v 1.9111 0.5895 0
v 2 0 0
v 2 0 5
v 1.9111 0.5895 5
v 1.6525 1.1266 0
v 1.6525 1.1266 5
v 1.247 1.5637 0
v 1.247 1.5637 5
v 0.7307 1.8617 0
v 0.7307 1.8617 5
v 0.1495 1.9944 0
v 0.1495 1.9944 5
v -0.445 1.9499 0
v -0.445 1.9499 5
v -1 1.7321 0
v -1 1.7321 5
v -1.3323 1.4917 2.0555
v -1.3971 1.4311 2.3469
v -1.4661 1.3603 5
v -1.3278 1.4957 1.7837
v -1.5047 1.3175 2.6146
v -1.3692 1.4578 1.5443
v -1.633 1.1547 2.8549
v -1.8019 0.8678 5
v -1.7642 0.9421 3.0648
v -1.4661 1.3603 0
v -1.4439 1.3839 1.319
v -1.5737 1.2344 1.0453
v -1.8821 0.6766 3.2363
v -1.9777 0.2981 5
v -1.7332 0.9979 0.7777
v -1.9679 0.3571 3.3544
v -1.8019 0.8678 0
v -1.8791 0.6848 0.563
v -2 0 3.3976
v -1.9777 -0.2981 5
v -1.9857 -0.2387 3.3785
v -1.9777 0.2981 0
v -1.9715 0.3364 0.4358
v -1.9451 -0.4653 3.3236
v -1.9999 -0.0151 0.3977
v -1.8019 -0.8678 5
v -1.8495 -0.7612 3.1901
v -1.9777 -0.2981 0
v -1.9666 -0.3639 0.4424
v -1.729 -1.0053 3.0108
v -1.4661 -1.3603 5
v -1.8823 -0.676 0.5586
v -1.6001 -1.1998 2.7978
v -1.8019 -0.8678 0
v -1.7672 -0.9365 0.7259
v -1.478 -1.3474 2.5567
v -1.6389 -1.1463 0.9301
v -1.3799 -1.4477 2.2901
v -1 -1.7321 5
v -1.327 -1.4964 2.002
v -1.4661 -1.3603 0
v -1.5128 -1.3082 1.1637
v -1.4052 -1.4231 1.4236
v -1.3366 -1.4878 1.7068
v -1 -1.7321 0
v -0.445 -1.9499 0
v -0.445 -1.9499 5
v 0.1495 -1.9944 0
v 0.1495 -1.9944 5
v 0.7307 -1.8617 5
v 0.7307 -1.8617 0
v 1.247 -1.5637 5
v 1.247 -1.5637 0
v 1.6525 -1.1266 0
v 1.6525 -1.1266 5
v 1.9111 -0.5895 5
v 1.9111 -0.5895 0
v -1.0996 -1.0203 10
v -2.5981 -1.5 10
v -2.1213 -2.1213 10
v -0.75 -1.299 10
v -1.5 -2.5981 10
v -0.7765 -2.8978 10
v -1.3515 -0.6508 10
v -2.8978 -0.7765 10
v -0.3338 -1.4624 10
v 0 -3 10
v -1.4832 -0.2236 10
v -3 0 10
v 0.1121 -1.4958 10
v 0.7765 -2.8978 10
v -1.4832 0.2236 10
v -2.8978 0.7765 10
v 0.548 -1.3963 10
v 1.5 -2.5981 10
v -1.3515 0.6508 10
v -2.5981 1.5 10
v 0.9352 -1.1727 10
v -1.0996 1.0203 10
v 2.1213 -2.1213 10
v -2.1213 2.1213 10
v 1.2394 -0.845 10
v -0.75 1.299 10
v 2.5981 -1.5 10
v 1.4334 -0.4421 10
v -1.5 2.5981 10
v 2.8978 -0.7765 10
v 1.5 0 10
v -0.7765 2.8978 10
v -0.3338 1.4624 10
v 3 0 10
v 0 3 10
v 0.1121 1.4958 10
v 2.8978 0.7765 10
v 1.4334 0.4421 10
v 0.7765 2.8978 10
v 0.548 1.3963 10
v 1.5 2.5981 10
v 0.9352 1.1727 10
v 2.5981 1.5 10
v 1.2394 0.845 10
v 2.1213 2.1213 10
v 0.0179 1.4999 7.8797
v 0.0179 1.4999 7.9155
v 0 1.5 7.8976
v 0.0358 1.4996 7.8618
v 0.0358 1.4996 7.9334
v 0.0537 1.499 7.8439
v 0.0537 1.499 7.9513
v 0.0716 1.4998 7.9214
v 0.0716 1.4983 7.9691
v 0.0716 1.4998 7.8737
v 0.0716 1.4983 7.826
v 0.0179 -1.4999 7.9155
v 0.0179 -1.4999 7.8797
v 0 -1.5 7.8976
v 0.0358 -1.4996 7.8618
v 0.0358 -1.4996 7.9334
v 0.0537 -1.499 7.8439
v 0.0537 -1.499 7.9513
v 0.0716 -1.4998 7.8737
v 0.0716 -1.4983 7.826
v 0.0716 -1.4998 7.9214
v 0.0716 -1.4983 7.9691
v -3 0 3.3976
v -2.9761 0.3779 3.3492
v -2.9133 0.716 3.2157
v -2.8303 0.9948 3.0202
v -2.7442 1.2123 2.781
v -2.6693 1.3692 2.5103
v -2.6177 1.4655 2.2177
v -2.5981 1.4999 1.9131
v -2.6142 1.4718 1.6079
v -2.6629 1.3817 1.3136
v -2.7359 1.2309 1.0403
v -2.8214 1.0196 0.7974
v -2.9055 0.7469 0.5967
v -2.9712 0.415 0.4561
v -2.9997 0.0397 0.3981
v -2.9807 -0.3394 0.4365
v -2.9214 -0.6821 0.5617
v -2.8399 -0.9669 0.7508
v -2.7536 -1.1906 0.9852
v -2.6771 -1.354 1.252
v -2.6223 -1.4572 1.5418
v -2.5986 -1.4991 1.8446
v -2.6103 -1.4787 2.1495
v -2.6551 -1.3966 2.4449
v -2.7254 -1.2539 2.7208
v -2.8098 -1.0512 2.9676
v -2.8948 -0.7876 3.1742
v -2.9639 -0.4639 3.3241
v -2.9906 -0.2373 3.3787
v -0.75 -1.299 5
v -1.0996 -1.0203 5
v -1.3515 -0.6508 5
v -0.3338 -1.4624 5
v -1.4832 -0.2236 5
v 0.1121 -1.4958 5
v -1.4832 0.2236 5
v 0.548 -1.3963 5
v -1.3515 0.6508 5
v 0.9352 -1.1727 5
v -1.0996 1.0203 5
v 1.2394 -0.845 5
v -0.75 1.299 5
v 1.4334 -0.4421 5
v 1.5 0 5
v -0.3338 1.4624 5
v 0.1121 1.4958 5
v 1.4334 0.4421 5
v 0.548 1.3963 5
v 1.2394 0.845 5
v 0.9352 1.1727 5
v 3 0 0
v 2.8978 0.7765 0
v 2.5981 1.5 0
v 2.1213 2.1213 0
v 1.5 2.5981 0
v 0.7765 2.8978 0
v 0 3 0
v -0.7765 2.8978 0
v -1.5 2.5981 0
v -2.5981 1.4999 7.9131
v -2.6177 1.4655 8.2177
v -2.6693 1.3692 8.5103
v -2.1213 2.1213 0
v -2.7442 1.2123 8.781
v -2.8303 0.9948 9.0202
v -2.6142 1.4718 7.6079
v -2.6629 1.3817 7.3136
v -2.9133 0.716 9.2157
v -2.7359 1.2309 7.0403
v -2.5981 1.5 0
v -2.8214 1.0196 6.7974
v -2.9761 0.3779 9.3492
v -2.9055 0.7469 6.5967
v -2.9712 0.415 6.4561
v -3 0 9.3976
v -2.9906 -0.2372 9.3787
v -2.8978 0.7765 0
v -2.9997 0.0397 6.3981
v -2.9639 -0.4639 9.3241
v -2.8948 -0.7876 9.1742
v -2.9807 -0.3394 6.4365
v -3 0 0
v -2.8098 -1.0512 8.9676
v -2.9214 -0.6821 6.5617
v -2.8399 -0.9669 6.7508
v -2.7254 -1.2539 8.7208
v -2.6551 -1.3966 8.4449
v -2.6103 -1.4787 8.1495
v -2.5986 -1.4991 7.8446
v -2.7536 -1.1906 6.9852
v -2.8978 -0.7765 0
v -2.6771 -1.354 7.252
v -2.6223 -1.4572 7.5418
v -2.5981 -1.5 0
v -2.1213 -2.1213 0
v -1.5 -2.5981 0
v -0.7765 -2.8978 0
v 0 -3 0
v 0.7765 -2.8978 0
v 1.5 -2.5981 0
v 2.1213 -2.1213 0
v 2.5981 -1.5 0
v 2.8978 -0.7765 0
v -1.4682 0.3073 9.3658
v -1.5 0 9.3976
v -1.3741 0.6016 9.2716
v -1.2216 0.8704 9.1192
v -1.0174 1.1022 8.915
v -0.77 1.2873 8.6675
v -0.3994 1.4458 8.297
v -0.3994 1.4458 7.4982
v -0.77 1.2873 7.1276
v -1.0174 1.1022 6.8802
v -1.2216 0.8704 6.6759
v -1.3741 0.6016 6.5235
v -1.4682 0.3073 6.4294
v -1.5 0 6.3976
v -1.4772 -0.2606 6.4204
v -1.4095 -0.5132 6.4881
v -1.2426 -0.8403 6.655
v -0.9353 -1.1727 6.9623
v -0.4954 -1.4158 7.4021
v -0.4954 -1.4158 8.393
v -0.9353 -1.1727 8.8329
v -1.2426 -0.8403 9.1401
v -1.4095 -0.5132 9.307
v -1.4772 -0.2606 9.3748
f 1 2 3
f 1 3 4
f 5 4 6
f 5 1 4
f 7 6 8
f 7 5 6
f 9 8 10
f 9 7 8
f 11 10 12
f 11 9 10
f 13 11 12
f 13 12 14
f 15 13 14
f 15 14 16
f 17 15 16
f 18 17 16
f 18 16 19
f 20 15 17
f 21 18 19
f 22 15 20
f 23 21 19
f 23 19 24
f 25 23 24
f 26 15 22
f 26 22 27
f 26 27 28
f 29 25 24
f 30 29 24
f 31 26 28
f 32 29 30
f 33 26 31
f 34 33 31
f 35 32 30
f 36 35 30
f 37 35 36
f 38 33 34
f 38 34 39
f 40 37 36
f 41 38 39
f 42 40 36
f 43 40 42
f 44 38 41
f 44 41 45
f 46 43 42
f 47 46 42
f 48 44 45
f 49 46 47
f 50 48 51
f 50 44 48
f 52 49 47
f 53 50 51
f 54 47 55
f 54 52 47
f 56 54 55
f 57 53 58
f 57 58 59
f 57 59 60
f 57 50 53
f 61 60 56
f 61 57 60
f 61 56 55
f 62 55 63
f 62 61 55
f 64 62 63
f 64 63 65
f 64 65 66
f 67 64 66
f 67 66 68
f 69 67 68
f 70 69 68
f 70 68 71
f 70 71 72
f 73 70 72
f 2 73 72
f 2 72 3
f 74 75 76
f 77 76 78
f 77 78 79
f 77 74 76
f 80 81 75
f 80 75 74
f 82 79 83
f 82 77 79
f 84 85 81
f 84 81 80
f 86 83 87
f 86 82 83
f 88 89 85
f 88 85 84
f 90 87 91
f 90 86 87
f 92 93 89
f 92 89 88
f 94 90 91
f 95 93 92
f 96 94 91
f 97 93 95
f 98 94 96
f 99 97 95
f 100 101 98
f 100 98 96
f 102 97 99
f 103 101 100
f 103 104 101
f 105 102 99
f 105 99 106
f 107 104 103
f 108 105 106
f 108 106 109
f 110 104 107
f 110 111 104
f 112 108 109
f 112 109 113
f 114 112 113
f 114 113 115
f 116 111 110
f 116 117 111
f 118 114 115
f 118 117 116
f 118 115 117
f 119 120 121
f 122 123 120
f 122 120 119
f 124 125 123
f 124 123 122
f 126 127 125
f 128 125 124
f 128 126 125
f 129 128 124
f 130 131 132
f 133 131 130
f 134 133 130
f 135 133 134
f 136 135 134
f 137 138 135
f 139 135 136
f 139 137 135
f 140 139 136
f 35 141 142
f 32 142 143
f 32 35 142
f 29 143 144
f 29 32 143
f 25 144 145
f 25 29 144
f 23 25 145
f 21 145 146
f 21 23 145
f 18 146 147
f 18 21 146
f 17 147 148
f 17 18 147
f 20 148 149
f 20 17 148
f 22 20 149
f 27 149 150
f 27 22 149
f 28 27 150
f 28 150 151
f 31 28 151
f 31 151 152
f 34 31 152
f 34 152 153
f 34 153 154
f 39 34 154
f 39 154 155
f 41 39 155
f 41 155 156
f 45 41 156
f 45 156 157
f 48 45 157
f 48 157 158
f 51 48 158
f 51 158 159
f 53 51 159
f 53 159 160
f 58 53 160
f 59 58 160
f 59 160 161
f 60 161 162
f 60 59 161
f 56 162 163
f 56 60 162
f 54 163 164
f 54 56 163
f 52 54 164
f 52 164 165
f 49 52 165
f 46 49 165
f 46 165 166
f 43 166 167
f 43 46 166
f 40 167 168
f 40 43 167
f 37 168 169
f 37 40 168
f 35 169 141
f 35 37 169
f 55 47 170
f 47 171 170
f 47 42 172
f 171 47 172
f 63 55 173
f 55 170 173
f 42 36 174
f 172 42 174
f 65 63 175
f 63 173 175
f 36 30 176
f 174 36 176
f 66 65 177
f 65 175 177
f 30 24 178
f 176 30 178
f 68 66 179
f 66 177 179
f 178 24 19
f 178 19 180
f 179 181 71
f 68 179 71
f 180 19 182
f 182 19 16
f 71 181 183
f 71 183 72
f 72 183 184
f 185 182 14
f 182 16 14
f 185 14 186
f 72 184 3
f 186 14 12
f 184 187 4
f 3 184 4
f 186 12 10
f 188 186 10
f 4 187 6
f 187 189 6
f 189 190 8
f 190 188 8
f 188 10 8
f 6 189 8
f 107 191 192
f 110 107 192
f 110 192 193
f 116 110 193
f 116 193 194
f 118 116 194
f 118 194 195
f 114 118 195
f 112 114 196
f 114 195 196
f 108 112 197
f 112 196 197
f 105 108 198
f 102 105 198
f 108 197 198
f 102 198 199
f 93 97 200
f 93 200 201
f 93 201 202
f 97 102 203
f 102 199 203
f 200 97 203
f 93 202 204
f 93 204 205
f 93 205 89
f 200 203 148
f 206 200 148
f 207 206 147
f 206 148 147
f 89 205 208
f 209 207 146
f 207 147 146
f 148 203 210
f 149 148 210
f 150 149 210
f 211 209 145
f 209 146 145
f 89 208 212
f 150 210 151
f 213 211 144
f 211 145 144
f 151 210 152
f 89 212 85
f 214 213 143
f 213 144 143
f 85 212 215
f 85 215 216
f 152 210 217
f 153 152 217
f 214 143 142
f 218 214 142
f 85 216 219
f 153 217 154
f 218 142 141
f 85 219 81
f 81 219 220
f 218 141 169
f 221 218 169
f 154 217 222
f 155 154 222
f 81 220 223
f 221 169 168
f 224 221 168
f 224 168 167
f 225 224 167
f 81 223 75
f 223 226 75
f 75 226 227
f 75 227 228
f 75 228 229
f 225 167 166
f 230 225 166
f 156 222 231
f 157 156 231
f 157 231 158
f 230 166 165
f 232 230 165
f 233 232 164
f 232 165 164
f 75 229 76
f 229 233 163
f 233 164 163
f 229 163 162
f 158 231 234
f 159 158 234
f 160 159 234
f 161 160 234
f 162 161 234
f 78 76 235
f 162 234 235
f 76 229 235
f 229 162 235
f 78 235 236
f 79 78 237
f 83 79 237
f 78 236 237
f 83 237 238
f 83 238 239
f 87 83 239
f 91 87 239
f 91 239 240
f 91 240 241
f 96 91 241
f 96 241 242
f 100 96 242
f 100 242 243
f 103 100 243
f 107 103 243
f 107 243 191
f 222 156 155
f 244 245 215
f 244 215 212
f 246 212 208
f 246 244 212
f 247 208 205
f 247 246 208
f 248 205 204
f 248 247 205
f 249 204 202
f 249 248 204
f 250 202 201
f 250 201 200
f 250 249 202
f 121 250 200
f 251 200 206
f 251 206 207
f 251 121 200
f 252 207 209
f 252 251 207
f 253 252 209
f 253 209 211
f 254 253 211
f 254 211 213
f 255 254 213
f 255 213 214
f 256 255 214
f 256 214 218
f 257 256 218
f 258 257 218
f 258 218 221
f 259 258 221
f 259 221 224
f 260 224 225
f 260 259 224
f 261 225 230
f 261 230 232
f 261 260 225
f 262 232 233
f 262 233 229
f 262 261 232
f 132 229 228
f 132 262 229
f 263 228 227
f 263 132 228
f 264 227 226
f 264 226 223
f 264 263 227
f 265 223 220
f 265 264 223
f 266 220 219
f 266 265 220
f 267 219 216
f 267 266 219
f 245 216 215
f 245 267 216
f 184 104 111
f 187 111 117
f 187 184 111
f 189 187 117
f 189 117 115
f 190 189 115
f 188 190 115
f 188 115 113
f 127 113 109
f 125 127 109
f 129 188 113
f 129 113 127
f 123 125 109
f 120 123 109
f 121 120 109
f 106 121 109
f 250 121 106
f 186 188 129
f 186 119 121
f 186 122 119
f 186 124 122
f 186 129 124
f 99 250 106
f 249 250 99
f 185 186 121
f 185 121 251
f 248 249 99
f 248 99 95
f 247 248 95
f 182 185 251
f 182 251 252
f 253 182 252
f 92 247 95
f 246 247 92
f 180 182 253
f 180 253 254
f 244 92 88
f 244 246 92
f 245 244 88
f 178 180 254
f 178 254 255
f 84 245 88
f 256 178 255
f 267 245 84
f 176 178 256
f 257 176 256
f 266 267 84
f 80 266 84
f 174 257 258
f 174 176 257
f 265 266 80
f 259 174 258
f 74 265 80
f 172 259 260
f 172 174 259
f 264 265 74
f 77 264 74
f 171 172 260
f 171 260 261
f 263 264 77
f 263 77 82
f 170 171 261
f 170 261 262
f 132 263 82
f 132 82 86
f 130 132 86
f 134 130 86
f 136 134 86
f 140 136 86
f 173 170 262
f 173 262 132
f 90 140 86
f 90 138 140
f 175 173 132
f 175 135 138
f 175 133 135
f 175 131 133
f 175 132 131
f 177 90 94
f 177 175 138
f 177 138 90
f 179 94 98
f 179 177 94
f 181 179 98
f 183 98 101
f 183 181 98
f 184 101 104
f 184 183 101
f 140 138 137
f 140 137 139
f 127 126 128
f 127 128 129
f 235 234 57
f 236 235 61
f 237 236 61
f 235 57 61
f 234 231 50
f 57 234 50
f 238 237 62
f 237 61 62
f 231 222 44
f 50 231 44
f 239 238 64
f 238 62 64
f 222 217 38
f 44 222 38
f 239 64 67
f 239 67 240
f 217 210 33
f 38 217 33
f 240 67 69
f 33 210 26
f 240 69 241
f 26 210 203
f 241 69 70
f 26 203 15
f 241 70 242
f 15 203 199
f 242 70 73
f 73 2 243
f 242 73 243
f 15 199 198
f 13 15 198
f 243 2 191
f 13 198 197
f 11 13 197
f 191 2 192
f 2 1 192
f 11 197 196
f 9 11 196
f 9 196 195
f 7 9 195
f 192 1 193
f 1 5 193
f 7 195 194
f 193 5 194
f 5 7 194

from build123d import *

# Parameters (mm, degrees)
CYLINDER003_R           = 1.5
CYLINDER003_DEPTH       = 10
CYLINDER003_PITCH_ANGLE = -90
CYLINDER002_R           = 1.5
CYLINDER002_DEPTH       = 8
CYLINDER_R              = 1.5
CYLINDER_DEPTH          = 10
CYLINDER_PITCH_ANGLE    = -90
CYLINDER001_R           = 2
CYLINDER001_DEPTH       = 8
SKETCH_R                = 3
PAD_DEPTH               = 10


with BuildPart() as cilindro003:
    # Cylinder003 → Cylinder003 (new body)
    with BuildSketch(Plane.XY):
        Circle(CYLINDER003_R)
    extrude(amount=CYLINDER003_DEPTH)


with BuildPart() as cilindro003_1:
    # Cylinder003 pitch: moved
    add(cilindro003.part.rotate(Axis((0, 0, 0), (0, 1, 0)), CYLINDER003_PITCH_ANGLE))


with BuildPart() as cilindro003_2:
    # Cylinder003 placement: moved
    add(cilindro003_1.part.moved(Location((0.071563, 0, 7.897581))))


with BuildPart() as cilindro002:
    # Cylinder002 → Cylinder002 (new body)
    with BuildSketch(Plane.XY.offset(5)):
        Circle(CYLINDER002_R)
    extrude(amount=CYLINDER002_DEPTH)


with BuildPart() as cilindro:
    # Cylinder → Cylinder (new body)
    with BuildSketch(Plane.XY):
        Circle(CYLINDER_R)
    extrude(amount=CYLINDER_DEPTH)


with BuildPart() as cilindro_1:
    # Cylinder pitch: moved
    add(cilindro.part.rotate(Axis((0, 0, 0), (0, 1, 0)), CYLINDER_PITCH_ANGLE))


with BuildPart() as cilindro_2:
    # Cylinder placement: moved
    add(cilindro_1.part.moved(Location((1.071563, 0, 1.897581))))


with BuildPart() as cilindro001:
    # Cylinder001 → Cylinder001 (new body)
    with BuildSketch(Plane.XY.offset(-3)):
        Circle(CYLINDER001_R)
    extrude(amount=CYLINDER001_DEPTH)


with BuildPart() as cut003:
    # Sketch → Pad (new body)
    with BuildSketch(Plane.XY):
        Circle(SKETCH_R)
    extrude(amount=PAD_DEPTH)

    # Cut: cut Cilindro001
    add(cilindro001.part, mode=Mode.SUBTRACT)

    # Cut001: cut Cilindro
    add(cilindro_2.part, mode=Mode.SUBTRACT)

    # Cut002: cut Cilindro002
    add(cilindro002.part, mode=Mode.SUBTRACT)

    # Cut003: cut Cilindro003
    add(cilindro003_2.part, mode=Mode.SUBTRACT)


solid = cut003.part
